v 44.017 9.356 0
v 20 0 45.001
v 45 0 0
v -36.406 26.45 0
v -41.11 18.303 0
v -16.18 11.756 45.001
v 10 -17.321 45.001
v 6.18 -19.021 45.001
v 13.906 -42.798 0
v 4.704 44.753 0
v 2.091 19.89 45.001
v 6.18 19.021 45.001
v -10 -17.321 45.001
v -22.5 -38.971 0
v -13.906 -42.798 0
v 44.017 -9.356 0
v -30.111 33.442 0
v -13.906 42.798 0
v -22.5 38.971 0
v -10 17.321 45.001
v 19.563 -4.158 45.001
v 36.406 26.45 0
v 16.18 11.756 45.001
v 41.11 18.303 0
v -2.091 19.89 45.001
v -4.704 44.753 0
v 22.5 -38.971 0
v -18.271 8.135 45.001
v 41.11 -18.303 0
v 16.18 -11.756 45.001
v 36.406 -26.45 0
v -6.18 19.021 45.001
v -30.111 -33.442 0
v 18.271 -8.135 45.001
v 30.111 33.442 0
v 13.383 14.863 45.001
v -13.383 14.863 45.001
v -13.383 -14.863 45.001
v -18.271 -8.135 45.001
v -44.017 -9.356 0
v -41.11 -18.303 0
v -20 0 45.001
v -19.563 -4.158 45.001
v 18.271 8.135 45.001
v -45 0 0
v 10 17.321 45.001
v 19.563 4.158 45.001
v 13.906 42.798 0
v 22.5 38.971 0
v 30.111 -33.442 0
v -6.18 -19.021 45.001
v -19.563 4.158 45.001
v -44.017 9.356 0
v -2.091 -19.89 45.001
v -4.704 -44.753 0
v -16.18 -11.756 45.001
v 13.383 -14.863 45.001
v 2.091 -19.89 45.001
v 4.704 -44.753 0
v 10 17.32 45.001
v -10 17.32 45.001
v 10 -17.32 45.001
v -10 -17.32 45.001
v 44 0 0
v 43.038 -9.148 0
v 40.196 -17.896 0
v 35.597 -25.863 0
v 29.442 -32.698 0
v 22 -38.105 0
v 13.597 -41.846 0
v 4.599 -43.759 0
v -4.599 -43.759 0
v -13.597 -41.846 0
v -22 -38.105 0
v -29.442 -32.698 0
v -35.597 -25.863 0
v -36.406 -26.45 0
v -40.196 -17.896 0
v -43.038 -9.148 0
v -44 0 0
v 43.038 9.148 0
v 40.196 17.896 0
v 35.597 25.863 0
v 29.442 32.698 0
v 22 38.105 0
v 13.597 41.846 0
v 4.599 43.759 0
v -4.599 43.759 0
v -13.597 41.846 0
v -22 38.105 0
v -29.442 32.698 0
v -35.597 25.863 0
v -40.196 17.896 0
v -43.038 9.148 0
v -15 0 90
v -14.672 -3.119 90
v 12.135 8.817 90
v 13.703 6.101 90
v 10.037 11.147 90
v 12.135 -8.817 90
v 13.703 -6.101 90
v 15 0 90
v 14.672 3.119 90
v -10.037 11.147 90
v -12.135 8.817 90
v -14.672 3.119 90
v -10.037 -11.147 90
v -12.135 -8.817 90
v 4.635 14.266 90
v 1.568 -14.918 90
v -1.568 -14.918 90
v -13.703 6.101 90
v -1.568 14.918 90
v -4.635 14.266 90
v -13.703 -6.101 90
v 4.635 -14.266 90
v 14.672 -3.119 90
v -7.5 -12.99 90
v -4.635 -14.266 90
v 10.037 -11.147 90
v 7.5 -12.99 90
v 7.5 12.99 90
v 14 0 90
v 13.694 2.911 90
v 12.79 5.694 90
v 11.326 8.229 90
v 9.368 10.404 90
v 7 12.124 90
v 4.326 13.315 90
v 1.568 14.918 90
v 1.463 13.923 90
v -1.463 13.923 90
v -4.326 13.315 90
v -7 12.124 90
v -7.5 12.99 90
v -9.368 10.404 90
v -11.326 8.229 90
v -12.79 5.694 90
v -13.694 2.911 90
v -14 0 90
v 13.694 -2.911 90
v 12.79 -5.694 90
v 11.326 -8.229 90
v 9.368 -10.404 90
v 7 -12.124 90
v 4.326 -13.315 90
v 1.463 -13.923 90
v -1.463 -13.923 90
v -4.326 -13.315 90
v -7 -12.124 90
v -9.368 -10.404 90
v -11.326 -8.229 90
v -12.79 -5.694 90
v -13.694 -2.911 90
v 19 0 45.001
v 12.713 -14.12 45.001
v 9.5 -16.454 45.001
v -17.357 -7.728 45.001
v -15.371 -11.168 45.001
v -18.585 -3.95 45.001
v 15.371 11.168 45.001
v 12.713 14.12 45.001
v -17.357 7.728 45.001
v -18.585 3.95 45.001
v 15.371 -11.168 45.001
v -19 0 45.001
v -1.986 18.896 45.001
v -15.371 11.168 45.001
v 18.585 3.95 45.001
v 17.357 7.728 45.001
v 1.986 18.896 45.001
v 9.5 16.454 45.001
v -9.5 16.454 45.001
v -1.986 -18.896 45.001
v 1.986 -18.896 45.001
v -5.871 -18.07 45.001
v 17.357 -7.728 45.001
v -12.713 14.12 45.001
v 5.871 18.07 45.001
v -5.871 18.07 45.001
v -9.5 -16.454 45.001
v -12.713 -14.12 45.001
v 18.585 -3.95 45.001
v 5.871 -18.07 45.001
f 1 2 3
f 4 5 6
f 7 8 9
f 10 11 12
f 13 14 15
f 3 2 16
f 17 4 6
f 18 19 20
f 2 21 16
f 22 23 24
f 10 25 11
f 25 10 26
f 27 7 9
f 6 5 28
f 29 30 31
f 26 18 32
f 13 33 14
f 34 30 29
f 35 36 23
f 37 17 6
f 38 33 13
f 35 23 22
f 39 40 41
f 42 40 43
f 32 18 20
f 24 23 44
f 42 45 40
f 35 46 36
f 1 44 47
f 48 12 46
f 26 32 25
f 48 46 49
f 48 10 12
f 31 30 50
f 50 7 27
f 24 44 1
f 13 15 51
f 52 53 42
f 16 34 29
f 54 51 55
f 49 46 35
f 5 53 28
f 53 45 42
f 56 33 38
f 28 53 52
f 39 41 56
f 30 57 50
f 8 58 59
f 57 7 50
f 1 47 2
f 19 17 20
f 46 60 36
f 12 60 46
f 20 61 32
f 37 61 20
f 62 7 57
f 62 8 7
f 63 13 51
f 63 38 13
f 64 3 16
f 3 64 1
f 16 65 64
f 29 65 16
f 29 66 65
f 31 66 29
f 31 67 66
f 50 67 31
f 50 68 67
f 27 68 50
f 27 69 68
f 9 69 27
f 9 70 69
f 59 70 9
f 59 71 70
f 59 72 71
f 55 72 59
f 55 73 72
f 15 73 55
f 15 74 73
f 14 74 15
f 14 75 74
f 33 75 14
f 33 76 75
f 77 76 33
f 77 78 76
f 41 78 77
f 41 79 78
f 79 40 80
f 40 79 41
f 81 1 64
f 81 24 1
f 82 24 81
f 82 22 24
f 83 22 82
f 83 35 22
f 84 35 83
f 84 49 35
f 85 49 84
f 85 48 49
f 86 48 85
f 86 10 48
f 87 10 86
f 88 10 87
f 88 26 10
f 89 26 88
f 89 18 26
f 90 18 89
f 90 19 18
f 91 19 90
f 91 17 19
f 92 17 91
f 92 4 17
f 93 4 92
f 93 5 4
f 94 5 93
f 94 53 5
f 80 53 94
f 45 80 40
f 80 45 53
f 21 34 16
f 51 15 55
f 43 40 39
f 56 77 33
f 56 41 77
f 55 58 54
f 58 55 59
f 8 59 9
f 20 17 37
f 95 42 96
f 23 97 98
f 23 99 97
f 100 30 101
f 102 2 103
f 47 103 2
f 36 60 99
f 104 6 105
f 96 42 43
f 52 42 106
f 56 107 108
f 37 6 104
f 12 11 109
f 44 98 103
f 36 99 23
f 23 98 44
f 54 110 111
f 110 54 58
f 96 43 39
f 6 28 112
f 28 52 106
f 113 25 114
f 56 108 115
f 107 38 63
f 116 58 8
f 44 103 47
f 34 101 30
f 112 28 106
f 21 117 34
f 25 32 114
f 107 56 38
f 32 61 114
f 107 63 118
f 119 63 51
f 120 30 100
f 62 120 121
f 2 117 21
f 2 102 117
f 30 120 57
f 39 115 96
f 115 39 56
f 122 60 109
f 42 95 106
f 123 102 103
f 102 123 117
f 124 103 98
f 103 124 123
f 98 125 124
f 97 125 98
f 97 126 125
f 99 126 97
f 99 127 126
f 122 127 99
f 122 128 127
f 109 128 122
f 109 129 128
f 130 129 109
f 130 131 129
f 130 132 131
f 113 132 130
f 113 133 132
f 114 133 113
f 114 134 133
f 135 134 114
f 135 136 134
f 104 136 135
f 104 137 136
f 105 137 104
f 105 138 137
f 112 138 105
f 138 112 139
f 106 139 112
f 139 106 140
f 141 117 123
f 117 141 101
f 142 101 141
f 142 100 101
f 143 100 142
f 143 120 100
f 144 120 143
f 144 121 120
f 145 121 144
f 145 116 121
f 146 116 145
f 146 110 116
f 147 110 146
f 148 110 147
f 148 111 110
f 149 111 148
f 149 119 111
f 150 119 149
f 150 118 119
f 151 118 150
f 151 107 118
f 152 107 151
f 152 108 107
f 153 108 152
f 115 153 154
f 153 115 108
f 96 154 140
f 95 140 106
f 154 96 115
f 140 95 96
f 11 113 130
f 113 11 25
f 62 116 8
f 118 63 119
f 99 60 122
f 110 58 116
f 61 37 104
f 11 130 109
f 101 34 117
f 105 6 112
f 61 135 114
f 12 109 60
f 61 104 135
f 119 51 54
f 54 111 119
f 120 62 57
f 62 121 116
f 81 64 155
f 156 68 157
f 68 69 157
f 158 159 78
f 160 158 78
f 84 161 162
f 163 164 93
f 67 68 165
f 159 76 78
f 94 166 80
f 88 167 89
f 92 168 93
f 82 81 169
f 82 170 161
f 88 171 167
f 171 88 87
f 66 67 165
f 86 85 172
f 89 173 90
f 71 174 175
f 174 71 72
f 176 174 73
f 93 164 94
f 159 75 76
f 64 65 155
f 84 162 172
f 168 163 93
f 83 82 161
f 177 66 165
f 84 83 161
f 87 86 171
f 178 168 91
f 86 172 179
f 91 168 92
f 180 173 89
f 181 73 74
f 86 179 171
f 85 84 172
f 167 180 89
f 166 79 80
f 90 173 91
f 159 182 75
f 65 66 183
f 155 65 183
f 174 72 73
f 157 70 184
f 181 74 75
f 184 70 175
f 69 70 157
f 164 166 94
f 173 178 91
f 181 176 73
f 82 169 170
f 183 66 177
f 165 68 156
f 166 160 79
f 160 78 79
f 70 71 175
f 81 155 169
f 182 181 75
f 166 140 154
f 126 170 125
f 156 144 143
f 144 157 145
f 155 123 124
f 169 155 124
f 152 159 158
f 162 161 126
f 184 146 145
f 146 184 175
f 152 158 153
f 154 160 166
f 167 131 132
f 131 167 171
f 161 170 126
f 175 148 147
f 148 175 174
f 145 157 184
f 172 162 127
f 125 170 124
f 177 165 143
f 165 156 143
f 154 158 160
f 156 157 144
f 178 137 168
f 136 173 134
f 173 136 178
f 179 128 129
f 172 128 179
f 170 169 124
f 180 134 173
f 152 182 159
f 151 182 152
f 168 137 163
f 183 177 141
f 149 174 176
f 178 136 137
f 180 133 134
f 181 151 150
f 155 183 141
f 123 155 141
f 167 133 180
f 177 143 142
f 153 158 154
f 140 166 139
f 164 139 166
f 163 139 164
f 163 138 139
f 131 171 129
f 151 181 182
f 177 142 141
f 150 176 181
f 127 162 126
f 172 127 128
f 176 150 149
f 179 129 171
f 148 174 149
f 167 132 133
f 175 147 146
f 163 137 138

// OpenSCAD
mouth = 30;
height1 = 45;
middle = 40;
height2 = 45;
lip = 90;
wall = 1;

nudge = 0.001;
module funnel(inset=0) {
    d=2*inset;
    cylinder(d1=lip-d,d2=middle-d,h=height2+nudge);
    translate([0,0,height2]) cylinder(d1=middle-d,d2=mouth-d,h=height1);
}

render(convexity=2)
difference() {
    funnel();
    funnel(inset=wall);
}
